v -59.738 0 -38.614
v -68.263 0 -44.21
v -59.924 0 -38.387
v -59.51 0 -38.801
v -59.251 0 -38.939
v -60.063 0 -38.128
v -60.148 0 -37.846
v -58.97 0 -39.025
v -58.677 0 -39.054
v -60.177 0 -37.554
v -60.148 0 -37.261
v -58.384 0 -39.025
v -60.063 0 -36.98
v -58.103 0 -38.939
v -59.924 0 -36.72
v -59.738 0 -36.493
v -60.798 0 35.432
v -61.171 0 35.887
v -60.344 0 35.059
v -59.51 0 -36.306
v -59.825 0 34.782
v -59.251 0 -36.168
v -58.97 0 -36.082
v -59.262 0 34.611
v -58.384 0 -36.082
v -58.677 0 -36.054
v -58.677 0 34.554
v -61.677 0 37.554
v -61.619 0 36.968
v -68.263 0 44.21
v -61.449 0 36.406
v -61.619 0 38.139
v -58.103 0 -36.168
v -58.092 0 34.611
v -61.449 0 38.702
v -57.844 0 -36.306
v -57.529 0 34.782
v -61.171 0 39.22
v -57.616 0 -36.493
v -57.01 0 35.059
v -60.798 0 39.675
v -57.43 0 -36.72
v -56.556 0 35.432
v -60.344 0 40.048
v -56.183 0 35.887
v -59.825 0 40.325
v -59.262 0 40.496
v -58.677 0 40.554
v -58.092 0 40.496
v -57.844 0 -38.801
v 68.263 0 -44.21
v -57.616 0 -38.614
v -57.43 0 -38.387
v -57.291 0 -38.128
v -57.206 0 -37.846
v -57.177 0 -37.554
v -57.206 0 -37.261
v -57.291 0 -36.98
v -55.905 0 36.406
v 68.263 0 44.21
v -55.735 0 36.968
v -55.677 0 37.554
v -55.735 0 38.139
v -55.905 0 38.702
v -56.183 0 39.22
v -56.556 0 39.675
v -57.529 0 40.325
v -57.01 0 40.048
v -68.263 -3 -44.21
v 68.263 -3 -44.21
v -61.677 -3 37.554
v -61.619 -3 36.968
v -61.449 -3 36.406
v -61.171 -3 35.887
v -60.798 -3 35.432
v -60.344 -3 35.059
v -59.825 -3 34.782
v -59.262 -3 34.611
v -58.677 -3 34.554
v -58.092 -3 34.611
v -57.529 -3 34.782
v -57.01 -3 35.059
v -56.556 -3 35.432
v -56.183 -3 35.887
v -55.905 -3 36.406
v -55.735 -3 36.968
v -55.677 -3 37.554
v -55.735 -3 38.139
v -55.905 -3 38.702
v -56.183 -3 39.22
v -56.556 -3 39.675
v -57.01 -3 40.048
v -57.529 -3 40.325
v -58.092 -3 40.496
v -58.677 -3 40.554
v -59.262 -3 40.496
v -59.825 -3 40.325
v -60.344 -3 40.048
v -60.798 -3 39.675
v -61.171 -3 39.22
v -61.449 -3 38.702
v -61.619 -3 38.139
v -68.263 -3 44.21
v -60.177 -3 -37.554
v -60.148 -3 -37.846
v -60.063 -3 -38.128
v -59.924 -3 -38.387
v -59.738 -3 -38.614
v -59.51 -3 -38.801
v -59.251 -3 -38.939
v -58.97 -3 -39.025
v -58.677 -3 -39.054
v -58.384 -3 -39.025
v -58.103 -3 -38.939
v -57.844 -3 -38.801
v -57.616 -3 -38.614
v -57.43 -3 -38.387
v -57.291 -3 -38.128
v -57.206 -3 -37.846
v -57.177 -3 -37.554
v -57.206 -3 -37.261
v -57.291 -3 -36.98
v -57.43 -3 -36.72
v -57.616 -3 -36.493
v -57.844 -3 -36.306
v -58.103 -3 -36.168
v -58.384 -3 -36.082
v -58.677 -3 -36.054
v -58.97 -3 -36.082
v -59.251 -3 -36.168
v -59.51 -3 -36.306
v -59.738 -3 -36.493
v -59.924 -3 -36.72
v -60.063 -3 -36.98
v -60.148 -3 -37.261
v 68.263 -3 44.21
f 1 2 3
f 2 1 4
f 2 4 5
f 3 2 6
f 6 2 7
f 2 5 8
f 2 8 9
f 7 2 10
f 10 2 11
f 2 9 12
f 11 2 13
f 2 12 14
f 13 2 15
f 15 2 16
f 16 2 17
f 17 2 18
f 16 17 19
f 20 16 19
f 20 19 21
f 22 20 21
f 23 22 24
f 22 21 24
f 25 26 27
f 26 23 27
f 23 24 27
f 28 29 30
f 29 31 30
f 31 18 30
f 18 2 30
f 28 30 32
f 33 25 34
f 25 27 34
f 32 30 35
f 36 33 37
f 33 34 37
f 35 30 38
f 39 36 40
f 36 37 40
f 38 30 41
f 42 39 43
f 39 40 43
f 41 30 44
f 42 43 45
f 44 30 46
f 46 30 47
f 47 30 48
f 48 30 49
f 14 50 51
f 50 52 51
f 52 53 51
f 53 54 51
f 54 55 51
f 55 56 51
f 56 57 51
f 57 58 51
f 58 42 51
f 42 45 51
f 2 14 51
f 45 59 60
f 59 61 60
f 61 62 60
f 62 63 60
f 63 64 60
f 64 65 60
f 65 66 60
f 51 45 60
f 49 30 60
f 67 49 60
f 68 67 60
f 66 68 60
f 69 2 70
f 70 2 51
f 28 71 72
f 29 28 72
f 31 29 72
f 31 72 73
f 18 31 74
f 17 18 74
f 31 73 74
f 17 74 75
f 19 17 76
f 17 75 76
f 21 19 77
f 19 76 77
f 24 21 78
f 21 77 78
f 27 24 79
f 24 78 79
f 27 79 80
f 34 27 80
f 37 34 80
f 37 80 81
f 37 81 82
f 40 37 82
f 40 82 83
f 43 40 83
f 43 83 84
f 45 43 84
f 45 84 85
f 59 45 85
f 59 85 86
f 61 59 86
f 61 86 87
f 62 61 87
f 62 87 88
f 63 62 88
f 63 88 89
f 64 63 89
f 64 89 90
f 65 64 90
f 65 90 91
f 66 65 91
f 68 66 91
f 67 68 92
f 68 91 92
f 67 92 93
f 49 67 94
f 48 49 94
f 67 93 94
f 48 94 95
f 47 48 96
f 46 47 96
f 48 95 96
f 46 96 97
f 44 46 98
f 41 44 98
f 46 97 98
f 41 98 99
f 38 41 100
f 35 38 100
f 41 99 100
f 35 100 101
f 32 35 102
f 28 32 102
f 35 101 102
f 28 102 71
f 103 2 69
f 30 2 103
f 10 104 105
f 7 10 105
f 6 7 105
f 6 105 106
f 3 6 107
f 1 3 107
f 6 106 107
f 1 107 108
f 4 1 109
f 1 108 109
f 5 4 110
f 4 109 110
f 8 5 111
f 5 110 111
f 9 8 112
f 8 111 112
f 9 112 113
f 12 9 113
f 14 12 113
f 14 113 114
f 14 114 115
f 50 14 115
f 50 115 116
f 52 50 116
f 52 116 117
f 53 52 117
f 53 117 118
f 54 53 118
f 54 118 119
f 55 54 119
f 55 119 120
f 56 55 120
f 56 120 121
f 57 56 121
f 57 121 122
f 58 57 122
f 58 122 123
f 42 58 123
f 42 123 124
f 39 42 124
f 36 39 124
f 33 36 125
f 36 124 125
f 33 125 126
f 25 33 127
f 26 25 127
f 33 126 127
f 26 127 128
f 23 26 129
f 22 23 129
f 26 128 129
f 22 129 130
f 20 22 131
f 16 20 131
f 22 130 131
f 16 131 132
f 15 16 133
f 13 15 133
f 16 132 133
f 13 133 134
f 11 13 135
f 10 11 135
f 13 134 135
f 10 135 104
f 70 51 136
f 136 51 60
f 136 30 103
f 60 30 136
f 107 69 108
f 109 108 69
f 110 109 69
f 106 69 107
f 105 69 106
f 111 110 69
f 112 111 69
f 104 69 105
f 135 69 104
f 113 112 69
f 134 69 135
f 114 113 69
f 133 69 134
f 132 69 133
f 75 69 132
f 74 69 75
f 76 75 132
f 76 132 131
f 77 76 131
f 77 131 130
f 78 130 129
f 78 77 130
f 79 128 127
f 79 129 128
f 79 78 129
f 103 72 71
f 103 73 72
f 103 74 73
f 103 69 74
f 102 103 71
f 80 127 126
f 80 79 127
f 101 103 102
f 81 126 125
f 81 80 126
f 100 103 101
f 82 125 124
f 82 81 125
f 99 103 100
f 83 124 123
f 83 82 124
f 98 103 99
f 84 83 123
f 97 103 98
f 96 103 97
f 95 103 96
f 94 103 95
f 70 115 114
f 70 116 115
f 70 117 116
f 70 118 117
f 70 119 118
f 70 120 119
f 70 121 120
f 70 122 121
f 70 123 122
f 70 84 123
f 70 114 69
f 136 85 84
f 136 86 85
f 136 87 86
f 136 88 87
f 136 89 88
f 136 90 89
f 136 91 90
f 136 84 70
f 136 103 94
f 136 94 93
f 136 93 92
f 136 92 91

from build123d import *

# Parameters (mm, degrees)
F0_W     = 136.5267336369
F0_H     = 88.4205549955
F1_DEPTH = 3
F2_D     = 30
F3_W     = 117.3540726304
F3_H     = 75.1073509455
F4_DEPTH = 3
F5_D     = 6
F6_D     = 3


with BuildPart() as f1:
    # F0 (on Front) → F1 (new body)
    with BuildSketch(Plane.XZ):
        Rectangle(F0_W, F0_H)
    extrude(amount=F1_DEPTH)

    # F2 (through all)
    with Locations(Plane(origin=(0, 0, 0), x_dir=(1, 0, 0), z_dir=(0, 1, 0))):
        with Locations((0, 0)):
            Hole(F2_D / 2)

    # F3 (on Front) → F4 (join)
    with BuildSketch(Plane.XZ):
        Rectangle(F3_W, F3_H)
    extrude(amount=F4_DEPTH)

    # F5 (through all)
    with Locations(Plane(origin=(0, 0, 0), x_dir=(1, 0, 0), z_dir=(0, 1, 0))):
        with Locations((-58.6770363152, -37.5536754727)):
            Hole(F5_D / 2)

    # F6 (through all)
    with Locations(Plane(origin=(0, 0, 0), x_dir=(1, 0, 0), z_dir=(0, 1, 0))):
        with Locations((-58.6770363152, 37.5536754727), (-58.6770363152, -37.5536754727)):
            Hole(F6_D / 2)


solid = f1.part
